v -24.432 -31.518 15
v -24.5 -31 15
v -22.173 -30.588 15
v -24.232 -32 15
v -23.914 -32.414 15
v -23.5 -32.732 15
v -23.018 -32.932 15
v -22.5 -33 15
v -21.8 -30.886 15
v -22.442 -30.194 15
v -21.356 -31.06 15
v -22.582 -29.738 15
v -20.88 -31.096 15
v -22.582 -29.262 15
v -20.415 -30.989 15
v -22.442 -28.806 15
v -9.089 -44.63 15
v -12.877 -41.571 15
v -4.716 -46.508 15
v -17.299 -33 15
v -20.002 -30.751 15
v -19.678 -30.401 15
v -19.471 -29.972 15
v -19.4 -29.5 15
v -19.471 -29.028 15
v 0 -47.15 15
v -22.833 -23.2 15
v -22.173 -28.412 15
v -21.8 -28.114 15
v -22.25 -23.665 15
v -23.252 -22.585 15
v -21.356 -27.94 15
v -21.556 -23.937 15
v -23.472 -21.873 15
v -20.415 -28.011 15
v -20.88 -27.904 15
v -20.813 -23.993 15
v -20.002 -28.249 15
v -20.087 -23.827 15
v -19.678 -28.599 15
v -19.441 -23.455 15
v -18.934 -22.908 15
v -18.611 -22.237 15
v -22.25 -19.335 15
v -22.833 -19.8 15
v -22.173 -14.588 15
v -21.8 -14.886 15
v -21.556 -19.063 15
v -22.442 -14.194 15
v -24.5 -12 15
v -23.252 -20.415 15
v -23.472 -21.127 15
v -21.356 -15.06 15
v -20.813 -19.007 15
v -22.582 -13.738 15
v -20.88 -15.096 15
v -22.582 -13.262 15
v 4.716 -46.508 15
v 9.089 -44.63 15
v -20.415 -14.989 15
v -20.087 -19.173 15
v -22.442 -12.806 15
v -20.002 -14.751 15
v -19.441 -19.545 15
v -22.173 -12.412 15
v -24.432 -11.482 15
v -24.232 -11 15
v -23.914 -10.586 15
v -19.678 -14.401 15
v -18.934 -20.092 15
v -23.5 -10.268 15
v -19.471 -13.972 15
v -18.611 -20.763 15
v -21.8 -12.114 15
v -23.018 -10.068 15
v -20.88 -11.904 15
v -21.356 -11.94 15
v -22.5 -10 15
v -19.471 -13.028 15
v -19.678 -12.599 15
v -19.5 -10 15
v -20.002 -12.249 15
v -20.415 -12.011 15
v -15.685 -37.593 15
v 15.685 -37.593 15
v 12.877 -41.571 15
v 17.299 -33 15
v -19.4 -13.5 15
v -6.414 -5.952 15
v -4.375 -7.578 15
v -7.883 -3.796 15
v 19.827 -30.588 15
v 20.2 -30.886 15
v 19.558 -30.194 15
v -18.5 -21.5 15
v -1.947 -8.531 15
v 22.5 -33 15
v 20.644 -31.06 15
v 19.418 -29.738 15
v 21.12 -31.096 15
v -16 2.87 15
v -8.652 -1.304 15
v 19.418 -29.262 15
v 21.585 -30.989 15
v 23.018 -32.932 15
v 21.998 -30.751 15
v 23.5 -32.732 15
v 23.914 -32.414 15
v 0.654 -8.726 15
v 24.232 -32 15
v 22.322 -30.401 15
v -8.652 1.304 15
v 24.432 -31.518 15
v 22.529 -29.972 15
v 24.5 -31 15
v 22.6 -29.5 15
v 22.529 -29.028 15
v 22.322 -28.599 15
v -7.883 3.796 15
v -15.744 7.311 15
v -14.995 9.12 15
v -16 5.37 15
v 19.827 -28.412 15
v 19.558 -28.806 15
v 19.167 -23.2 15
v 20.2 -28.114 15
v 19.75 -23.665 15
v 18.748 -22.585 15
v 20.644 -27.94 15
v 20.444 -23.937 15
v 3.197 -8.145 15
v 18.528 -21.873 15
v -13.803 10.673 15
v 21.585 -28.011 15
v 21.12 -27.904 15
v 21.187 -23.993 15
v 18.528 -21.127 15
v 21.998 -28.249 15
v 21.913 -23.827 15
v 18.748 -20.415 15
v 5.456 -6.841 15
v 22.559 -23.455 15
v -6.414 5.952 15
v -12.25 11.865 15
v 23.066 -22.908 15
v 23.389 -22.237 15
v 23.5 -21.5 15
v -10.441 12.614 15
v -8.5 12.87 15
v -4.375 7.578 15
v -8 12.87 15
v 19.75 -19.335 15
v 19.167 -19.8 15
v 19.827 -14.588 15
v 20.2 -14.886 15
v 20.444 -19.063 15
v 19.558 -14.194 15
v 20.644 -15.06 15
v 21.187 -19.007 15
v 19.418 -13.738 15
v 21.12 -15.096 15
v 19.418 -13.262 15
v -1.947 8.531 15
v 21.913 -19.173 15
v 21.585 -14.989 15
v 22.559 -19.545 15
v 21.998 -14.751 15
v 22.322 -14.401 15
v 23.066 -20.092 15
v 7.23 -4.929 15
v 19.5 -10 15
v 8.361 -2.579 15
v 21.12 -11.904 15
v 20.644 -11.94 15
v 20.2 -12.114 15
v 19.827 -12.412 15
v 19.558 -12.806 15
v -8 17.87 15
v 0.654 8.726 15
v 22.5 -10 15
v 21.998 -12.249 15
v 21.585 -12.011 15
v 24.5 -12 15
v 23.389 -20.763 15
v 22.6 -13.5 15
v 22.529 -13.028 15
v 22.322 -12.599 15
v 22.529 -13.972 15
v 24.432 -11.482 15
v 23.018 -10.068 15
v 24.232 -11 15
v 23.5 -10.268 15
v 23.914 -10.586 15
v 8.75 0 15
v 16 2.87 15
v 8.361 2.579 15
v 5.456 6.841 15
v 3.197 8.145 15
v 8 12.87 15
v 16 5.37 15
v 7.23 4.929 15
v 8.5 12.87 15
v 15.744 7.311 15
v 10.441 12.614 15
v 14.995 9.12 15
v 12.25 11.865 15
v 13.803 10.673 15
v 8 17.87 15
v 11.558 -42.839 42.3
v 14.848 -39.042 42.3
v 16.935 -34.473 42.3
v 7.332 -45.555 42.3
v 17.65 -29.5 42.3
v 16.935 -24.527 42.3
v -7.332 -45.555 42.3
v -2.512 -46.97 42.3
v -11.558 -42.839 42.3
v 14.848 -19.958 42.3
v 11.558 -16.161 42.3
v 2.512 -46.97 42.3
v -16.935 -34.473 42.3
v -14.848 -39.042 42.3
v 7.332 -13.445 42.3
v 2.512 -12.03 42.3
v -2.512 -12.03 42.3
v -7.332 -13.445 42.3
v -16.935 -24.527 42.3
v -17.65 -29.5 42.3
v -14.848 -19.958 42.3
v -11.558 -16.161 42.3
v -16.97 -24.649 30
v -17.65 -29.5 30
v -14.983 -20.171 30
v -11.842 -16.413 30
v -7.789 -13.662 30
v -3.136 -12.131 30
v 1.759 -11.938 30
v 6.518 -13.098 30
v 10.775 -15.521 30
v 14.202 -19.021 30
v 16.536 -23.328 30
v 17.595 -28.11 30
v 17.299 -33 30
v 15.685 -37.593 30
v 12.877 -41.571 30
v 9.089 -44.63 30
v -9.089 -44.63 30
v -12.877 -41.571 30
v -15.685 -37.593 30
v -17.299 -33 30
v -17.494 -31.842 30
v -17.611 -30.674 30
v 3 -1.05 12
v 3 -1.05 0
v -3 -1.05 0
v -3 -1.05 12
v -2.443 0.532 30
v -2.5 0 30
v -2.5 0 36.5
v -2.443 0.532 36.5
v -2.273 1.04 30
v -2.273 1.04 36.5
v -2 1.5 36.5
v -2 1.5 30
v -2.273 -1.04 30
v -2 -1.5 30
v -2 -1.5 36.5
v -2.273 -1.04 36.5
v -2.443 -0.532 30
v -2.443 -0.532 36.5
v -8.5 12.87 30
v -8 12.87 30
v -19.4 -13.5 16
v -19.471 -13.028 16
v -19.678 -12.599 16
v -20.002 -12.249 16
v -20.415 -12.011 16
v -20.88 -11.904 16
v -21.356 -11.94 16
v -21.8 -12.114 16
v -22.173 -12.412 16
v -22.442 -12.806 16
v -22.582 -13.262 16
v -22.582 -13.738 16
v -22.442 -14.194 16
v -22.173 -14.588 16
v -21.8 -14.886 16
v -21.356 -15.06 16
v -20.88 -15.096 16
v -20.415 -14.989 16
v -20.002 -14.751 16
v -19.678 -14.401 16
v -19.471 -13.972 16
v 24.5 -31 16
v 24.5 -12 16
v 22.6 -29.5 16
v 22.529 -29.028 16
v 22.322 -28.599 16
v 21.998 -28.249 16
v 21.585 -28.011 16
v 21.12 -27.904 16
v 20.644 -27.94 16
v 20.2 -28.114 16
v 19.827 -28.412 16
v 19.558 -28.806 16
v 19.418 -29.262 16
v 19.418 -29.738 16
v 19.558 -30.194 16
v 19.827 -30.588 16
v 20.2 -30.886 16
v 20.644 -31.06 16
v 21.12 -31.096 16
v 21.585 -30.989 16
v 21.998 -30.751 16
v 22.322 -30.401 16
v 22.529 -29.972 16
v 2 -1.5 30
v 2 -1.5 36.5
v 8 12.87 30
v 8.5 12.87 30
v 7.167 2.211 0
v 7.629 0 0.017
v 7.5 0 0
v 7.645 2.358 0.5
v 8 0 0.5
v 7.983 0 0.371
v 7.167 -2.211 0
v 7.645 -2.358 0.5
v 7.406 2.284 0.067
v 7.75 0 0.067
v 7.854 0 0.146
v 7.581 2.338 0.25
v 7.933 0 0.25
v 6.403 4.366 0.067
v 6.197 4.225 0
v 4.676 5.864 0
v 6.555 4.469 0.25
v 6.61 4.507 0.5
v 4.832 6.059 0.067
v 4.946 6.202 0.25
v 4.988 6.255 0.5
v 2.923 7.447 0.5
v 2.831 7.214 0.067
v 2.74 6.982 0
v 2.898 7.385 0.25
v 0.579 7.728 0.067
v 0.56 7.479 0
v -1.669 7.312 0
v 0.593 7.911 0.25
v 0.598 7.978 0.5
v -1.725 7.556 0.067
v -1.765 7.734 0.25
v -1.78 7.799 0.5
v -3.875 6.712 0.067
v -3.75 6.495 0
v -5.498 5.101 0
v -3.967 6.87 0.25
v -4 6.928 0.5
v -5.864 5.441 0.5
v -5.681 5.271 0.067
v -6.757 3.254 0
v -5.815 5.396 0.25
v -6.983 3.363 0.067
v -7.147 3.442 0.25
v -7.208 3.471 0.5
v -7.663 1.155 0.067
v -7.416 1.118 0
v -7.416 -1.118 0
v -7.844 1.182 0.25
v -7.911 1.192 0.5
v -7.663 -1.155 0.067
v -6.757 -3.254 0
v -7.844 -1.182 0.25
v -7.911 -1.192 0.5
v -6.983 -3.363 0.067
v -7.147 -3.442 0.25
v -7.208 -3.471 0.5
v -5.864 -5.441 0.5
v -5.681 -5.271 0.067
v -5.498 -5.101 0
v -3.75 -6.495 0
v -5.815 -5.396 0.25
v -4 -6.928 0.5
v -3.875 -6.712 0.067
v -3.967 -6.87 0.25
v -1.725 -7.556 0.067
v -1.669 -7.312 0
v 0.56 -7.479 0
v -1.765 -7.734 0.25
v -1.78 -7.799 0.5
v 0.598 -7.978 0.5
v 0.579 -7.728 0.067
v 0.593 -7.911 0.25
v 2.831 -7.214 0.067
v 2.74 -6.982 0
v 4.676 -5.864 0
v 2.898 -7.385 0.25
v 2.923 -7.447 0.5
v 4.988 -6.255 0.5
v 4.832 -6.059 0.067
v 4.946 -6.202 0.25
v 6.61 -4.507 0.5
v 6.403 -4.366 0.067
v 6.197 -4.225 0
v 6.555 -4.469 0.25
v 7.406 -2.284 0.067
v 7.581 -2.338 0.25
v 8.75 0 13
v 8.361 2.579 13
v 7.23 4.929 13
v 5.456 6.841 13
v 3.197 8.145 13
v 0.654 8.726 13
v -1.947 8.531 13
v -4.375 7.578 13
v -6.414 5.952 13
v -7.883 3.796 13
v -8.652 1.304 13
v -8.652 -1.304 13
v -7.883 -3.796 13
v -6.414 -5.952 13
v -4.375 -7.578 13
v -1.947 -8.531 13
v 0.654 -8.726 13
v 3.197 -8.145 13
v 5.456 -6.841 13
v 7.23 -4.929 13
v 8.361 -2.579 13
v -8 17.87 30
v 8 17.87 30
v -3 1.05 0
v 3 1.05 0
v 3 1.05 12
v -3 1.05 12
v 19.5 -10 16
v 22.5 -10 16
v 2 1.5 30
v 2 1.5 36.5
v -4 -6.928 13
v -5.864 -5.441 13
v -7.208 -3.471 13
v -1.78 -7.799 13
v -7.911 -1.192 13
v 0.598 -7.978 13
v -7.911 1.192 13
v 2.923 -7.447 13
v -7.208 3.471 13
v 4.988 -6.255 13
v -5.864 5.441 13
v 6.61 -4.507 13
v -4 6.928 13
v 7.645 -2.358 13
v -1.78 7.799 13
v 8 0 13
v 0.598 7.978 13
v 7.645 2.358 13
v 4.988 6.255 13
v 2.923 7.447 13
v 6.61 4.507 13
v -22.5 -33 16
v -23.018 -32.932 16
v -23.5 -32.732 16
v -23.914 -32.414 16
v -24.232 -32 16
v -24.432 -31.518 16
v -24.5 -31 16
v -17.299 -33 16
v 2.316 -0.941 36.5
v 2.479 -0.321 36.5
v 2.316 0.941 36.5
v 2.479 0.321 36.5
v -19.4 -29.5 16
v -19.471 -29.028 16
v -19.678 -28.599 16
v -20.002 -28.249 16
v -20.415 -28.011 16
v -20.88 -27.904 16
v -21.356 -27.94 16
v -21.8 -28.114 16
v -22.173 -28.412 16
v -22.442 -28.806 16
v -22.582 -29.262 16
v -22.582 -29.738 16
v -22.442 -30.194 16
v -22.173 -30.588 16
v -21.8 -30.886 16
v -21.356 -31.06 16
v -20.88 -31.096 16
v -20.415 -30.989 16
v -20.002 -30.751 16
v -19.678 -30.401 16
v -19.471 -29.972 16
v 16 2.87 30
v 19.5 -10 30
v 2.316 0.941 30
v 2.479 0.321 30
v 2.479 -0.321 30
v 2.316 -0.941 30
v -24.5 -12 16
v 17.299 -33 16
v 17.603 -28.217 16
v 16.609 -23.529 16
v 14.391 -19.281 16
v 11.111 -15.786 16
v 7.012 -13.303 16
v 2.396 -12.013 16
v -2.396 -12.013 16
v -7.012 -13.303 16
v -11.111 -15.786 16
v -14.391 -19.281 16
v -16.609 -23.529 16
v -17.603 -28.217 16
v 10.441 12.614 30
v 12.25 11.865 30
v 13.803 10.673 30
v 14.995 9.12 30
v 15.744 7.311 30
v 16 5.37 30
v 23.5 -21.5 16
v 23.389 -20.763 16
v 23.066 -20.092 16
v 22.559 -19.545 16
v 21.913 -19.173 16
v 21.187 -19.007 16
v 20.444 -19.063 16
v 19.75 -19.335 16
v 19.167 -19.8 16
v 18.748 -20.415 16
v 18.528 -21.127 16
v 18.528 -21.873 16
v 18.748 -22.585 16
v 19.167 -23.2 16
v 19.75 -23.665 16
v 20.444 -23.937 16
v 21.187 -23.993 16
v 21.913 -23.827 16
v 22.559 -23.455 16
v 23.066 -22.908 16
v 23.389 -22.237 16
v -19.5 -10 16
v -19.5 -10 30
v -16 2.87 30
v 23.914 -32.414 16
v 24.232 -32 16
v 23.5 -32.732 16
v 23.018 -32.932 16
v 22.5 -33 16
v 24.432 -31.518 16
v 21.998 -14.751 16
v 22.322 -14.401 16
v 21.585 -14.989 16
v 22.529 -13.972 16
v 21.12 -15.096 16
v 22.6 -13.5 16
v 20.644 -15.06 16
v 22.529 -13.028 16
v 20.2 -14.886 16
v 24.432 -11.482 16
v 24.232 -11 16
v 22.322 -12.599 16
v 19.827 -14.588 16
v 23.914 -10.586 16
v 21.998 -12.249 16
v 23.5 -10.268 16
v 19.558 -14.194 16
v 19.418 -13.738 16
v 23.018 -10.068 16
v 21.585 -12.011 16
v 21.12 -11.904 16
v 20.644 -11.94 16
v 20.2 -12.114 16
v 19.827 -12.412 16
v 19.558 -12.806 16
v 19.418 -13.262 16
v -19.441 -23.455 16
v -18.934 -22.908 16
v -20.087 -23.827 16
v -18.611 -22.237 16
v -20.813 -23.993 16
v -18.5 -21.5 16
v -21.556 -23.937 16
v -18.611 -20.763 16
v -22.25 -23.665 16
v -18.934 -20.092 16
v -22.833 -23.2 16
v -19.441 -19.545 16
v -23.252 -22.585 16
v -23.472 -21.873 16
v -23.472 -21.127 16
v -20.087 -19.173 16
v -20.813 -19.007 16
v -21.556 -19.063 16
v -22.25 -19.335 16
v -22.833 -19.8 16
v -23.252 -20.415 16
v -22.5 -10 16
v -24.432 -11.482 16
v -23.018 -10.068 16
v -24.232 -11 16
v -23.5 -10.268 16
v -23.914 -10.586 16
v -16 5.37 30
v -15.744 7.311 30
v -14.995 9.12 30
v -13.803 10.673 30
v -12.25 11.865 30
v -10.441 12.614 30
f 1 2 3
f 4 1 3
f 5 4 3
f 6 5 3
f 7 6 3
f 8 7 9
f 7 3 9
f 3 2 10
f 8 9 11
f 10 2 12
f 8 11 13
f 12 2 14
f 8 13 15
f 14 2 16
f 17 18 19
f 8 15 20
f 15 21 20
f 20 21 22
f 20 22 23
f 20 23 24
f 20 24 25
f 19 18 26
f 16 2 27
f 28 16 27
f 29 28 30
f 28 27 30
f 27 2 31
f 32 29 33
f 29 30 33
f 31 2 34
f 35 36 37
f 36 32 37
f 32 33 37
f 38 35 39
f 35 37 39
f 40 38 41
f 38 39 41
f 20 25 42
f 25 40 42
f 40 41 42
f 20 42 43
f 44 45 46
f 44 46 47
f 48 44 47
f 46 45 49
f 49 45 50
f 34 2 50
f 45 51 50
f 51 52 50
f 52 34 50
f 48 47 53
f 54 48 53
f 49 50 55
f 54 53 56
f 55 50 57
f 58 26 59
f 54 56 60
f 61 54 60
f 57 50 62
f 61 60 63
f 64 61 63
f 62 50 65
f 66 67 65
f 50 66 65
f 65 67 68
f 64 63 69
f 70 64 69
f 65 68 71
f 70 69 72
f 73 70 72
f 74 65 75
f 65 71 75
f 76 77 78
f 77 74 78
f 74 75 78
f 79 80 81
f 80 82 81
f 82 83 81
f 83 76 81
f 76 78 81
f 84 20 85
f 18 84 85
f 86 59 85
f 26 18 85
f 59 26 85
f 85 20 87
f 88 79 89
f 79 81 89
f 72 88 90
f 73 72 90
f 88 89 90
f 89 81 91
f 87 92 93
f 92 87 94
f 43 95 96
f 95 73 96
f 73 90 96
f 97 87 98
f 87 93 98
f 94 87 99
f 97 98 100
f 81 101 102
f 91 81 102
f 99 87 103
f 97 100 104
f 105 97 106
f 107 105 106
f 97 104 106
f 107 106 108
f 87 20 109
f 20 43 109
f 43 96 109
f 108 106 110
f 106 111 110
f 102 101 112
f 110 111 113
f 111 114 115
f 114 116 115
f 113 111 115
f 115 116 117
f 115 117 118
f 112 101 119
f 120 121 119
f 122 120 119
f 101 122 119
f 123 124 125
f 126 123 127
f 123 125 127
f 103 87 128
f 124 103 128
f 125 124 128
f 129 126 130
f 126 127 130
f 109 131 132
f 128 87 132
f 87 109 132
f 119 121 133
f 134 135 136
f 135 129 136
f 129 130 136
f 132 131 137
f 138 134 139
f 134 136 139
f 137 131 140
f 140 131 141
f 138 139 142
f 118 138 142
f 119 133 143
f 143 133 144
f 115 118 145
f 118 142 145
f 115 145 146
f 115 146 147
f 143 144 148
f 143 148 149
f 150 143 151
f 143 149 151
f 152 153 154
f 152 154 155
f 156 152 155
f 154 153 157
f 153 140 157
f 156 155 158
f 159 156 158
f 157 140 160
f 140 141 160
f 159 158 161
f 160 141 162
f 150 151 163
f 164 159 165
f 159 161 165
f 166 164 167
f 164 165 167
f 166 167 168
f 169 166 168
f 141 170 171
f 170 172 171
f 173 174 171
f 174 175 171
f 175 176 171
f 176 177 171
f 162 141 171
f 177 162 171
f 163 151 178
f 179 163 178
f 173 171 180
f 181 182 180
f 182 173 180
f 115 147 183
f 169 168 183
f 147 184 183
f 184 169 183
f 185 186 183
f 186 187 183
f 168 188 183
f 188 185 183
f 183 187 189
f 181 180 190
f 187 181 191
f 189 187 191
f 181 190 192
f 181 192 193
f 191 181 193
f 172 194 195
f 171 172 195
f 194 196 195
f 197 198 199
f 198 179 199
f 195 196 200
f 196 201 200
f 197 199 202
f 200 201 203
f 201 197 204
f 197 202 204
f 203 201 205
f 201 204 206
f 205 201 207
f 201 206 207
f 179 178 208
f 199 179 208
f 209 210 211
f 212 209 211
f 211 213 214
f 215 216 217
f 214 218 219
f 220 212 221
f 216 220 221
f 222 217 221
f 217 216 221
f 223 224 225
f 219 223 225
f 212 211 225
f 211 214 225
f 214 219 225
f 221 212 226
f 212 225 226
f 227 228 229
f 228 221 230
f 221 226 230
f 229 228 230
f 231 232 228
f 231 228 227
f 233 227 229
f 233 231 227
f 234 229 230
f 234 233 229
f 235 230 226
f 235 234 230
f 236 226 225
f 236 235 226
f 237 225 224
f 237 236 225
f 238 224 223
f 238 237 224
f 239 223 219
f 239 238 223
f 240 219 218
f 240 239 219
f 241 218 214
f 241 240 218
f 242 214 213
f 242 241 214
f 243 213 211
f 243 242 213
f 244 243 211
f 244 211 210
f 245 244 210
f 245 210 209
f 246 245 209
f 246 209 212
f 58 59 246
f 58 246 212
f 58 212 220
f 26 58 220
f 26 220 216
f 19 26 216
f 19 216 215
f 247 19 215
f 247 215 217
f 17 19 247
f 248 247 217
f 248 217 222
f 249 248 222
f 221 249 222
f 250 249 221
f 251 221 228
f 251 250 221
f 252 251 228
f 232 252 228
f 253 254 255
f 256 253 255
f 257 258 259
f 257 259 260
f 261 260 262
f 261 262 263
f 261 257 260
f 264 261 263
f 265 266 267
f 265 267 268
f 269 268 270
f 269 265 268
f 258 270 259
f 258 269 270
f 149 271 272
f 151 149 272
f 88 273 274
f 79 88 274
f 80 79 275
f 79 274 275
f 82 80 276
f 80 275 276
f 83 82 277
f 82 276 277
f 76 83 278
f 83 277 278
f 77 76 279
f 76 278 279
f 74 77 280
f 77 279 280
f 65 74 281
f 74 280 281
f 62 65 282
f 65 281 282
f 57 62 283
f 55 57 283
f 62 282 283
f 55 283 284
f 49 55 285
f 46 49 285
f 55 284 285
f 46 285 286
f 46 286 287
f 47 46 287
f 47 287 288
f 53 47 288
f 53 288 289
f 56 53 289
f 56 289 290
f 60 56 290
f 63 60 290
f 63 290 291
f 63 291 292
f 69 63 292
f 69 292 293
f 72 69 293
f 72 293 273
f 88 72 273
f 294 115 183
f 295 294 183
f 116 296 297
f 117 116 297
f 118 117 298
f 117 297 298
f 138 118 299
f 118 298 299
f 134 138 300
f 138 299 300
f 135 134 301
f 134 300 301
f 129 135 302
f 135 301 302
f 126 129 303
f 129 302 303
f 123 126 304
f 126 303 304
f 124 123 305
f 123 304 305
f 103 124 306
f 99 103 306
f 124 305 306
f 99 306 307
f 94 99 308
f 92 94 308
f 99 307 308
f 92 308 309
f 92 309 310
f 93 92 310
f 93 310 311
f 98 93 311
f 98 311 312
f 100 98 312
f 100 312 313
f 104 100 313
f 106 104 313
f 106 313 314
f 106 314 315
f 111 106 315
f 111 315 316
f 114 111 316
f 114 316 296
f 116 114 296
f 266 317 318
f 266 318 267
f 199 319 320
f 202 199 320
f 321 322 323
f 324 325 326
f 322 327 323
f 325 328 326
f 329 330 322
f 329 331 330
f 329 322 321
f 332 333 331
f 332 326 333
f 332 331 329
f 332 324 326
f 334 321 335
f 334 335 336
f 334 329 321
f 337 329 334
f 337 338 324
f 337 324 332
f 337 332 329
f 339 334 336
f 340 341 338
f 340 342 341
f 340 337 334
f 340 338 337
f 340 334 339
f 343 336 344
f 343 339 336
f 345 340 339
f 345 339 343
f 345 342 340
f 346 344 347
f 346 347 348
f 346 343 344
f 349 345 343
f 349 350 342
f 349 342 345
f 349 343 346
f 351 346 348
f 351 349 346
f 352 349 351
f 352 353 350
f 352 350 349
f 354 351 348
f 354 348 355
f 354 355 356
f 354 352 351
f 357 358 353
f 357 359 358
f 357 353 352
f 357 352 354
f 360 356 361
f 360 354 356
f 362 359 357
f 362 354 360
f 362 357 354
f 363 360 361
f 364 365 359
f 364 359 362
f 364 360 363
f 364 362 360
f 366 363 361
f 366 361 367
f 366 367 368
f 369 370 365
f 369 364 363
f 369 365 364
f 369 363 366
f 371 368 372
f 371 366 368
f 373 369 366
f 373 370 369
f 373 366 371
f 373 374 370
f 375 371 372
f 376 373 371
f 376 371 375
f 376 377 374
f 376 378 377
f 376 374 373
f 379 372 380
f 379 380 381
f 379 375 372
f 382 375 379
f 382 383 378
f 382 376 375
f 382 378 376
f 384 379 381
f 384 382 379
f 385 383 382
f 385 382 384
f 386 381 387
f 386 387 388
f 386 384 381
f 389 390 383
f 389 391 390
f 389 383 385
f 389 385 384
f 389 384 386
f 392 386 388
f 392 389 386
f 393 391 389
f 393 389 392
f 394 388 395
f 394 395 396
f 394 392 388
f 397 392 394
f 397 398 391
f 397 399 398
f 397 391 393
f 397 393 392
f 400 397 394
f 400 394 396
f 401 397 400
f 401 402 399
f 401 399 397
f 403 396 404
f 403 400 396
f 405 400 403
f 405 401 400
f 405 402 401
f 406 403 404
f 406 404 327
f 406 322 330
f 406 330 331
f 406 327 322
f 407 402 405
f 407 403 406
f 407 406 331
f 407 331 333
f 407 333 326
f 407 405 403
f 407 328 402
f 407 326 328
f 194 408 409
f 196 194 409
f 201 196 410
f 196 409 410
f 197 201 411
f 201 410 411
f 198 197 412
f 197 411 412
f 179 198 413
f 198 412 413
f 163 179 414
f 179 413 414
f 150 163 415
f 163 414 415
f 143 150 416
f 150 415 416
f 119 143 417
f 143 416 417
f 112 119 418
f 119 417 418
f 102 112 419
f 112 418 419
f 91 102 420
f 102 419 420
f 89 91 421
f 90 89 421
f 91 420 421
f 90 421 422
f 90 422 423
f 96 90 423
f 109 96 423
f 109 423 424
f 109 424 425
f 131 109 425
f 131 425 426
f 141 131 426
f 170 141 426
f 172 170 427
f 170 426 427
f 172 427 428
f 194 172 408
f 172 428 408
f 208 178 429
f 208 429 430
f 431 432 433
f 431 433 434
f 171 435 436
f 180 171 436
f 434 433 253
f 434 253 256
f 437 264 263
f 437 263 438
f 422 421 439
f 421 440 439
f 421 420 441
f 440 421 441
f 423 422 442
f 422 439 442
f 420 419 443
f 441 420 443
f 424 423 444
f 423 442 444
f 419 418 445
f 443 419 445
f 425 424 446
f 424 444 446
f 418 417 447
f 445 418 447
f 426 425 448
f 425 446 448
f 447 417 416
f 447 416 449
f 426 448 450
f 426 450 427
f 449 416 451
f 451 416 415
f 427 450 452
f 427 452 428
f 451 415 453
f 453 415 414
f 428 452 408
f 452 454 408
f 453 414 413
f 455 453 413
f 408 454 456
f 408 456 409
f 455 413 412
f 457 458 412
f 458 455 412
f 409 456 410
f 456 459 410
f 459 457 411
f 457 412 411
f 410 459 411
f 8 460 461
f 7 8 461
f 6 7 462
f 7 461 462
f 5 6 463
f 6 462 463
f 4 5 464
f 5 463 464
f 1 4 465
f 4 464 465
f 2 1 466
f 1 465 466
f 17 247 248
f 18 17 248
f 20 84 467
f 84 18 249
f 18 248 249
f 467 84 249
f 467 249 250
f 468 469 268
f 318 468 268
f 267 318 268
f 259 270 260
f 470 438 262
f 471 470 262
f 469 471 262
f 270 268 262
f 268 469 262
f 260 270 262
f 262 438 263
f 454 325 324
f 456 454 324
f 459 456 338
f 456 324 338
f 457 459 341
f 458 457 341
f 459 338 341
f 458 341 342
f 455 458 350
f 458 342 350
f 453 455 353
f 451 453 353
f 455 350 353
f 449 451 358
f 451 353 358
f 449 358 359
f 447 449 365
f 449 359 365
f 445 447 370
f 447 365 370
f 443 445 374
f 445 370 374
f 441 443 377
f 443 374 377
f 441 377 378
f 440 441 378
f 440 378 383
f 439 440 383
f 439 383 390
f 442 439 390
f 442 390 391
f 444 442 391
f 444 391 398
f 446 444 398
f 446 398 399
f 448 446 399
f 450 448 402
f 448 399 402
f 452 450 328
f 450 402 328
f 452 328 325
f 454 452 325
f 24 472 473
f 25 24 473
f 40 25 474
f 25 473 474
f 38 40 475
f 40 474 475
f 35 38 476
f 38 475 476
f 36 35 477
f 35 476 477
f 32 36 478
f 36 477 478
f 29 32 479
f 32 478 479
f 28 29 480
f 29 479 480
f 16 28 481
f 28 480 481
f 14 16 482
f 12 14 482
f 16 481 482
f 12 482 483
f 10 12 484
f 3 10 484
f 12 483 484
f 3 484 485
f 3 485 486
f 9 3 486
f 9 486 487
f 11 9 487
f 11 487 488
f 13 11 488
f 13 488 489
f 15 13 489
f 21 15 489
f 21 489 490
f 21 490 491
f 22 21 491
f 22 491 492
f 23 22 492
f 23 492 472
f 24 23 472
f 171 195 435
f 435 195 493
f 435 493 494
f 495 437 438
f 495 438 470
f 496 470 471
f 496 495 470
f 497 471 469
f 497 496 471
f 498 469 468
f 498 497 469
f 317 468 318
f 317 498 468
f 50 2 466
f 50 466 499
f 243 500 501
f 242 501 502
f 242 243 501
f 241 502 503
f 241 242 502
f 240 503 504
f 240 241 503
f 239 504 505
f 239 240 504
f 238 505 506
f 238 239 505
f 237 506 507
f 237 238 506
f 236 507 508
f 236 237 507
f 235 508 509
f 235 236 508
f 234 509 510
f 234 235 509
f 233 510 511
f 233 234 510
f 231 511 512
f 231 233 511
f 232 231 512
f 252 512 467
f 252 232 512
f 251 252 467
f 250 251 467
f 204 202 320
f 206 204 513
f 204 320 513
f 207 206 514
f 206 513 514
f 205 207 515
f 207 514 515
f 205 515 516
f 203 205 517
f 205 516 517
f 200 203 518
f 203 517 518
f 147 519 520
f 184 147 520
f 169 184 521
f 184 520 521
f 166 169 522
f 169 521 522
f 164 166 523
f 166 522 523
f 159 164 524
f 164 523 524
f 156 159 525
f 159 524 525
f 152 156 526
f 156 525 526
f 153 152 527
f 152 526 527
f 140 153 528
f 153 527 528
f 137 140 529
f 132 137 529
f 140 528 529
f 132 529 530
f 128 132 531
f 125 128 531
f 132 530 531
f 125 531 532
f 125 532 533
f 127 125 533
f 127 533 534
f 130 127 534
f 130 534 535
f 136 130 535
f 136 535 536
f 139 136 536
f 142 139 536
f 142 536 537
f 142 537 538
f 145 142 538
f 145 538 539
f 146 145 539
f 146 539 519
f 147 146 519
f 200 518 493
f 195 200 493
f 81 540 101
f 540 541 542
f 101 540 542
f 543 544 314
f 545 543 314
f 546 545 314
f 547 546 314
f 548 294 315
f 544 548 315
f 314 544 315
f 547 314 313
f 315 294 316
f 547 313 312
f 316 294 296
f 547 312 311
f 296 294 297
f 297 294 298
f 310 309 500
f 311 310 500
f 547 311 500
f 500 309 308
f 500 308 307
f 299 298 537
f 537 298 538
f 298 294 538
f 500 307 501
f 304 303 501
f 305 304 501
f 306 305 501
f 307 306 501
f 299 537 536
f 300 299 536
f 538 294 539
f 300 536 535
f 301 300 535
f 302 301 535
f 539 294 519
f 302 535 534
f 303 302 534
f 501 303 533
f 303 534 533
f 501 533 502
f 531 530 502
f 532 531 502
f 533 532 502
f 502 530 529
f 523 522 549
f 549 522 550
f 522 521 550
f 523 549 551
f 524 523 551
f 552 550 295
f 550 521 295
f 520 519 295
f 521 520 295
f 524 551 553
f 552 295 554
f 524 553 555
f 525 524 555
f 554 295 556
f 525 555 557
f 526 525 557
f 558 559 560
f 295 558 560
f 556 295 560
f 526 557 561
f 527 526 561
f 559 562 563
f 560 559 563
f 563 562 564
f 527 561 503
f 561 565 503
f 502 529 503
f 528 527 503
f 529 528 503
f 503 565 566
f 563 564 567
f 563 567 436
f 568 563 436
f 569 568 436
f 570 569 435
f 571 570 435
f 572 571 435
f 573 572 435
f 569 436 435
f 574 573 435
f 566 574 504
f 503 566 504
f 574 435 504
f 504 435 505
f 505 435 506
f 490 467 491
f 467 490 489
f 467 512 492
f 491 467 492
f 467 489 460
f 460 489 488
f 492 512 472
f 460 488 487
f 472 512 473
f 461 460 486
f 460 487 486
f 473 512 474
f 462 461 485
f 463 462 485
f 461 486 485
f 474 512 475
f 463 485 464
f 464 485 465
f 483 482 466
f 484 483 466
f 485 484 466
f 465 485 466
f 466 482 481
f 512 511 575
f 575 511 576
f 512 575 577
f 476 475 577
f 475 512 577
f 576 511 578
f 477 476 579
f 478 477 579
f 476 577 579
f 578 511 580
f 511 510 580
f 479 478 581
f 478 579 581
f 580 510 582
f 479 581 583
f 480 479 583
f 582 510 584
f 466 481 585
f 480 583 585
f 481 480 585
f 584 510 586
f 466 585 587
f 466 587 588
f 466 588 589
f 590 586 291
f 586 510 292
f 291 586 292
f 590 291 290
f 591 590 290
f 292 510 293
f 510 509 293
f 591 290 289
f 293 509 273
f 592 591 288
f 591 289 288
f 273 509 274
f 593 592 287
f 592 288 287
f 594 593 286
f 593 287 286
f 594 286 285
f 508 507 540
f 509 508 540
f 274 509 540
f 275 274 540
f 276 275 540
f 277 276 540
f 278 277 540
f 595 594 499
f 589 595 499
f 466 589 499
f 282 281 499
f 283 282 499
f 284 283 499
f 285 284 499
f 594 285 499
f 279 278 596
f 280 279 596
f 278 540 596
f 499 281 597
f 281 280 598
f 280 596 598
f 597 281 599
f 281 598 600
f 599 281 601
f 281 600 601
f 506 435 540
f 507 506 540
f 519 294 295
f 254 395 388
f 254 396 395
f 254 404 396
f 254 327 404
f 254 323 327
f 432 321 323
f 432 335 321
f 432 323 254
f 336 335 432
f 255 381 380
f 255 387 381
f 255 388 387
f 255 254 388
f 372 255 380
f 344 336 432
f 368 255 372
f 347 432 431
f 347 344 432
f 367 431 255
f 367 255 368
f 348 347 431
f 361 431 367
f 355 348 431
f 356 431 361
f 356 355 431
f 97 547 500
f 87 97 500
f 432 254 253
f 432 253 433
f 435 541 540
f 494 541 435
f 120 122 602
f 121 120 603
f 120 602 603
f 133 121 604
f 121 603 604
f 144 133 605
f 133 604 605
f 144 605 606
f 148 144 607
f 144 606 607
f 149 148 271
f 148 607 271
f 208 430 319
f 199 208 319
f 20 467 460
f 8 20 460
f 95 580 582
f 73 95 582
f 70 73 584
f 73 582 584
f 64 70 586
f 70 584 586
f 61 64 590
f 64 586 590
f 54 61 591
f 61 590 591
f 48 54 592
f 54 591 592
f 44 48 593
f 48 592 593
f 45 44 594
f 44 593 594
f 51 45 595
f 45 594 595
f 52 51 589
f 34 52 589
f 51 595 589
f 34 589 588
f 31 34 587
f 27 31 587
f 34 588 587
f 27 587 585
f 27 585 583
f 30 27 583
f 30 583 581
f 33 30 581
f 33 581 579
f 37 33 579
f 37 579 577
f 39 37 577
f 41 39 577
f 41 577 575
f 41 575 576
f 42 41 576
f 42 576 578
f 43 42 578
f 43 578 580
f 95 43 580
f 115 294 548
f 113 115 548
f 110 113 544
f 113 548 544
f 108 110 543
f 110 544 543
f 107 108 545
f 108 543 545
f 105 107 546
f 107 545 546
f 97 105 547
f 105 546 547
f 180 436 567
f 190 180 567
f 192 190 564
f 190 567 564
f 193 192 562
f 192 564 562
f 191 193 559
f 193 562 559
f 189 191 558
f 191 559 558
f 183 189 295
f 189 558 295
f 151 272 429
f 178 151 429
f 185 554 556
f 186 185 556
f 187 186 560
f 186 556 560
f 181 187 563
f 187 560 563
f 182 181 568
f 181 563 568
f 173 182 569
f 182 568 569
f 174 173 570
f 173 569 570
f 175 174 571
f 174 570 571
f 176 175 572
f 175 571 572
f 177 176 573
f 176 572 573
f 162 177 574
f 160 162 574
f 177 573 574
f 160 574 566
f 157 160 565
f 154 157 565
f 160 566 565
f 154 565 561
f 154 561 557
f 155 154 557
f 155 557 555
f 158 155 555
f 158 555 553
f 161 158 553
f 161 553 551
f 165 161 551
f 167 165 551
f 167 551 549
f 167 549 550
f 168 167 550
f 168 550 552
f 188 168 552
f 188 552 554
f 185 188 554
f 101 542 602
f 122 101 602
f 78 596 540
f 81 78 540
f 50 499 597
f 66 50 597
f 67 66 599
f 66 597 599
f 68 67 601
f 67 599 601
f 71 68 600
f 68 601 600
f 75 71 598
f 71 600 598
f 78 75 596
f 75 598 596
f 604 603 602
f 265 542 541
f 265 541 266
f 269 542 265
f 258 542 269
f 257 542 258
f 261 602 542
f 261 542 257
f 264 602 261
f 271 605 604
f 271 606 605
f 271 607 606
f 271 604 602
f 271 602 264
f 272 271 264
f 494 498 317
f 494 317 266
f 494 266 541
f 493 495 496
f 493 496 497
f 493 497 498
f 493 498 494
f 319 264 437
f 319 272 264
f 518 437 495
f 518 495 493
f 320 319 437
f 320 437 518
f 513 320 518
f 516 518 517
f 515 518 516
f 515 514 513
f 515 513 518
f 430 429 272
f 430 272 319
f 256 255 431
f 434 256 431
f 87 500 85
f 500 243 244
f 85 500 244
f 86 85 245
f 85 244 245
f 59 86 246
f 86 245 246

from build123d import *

# Parameters (mm, degrees)
SKETCH1_R           = 8
BOSS_EXTRUDE1_DEPTH = 13
SKETCH2_R           = 8.75
BOSS_EXTRUDE2_DEPTH = 2
SKETCH3_W           = 49
SKETCH3_H           = 62.5
BOSS_EXTRUDE3_DEPTH = 15
SKETCH4_R           = 17.65
BOSS_EXTRUDE4_DEPTH = 27.3
BOSS_EXTRUDE6_DEPTH = 36.5
SKETCH7_W           = 81.110714311
SKETCH7_H           = 82.460514398
CUT_EXTRUDE1_DEPTH  = 31
CUT_EXTRUDE2_DEPTH  = 14
SKETCH9_R           = 2.5
CUT_EXTRUDE4_DEPTH  = 17
SKETCH10_R          = 1.6
CUT_EXTRUDE5_DEPTH  = 17
FILLET1_R           = 0.5
SKETCH11_W          = 6
SKETCH11_H          = 2.1
CUT_EXTRUDE6_DEPTH  = 12


with BuildPart() as part:
    # Sketch1 → Boss-Extrude1 (new body)
    with BuildSketch(Plane.XY):
        Circle(SKETCH1_R)
    extrude(amount=BOSS_EXTRUDE1_DEPTH)

    # Sketch2 → Boss-Extrude2 (add)
    with BuildSketch(Plane.XY.offset(13)):
        Circle(SKETCH2_R)
    extrude(amount=BOSS_EXTRUDE2_DEPTH)

    # Sketch3 → Boss-Extrude3 (add)
    with BuildSketch(Plane.XY.offset(15)):
        with Locations((0, -13.38)):
            Rectangle(SKETCH3_W, SKETCH3_H)
    extrude(amount=BOSS_EXTRUDE3_DEPTH)

    # Sketch4 → Boss-Extrude4 (add)
    with BuildSketch(Plane(origin=(0, 0, 15), x_dir=(-1, 0, 0), z_dir=(0, 0, -1))):
        with Locations((0, -29.5)):
            Circle(SKETCH4_R)
    extrude(amount=-BOSS_EXTRUDE4_DEPTH)

    # Sketch6 → Boss-Extrude6 (add)
    with BuildSketch(Plane(origin=(0, 0, 0), x_dir=(-1, 0, 0), z_dir=(0, 0, -1))):
        with BuildLine():
            Line((2, 1.5), (-2, 1.5))
            ThreePointArc((-2, 1.5), (-2.5, 0), (-2, -1.5))
            Line((-2, -1.5), (2, -1.5))
            ThreePointArc((2, -1.5), (2.371708245, -0.790569415), (2.5, 0))
            ThreePointArc((2.5, 0), (2.371708245, 0.790569415), (2, 1.5))
        make_face()
    extrude(amount=-BOSS_EXTRUDE6_DEPTH)

    # Sketch7 → Cut-Extrude1 (cut, through all)
    with BuildSketch(Plane.XY.offset(30)):
        with Locations((0.873030834, -13.704939381)):
            Rectangle(SKETCH7_W, SKETCH7_H)
        with BuildLine():
            Line((-8, 17.87), (8, 17.87))
            Line((8, 17.87), (8, 12.87))
            Line((8, 12.87), (8.5, 12.87))
            ThreePointArc((8.5, 12.87), (13.803300859, 10.673300859), (16, 5.37))
            Line((16, 5.37), (16, 2.87))
            Line((16, 2.87), (19.5, -10))
            Line((19.5, -10), (22.5, -10))
            ThreePointArc((22.5, -10), (23.914213562, -10.585786438), (24.5, -12))
            Line((24.5, -12), (24.5, -31))
            ThreePointArc((24.5, -31), (23.914213562, -32.414213562), (22.5, -33))
            Line((22.5, -33), (17.299494212, -33))
            ThreePointArc((17.299494212, -33), (0, -47.15), (-17.299494212, -33))
            Line((-17.299494212, -33), (-22.5, -33))
            ThreePointArc((-22.5, -33), (-23.914213562, -32.414213562), (-24.5, -31))
            Line((-24.5, -31), (-24.5, -12))
            ThreePointArc((-24.5, -12), (-23.914213562, -10.585786438), (-22.5, -10))
            Line((-22.5, -10), (-19.5, -10))
            Line((-19.5, -10), (-16, 2.87))
            Line((-16, 2.87), (-16, 5.37))
            ThreePointArc((-16, 5.37), (-13.803300859, 10.673300859), (-8.5, 12.87))
            Line((-8.5, 12.87), (-8, 12.87))
            Line((-8, 12.87), (-8, 17.87))
        make_face(mode=Mode.SUBTRACT)
    extrude(amount=-CUT_EXTRUDE1_DEPTH, mode=Mode.SUBTRACT)

    # Sketch8 → Cut-Extrude2 (cut)
    with BuildSketch(Plane.XY.offset(30)):
        with BuildLine():
            Line((-17.299494212, -33), (-22.5, -33))
            ThreePointArc((-22.5, -33), (-23.914213562, -32.414213562), (-24.5, -31))
            Line((-24.5, -31), (-24.5, -12))
            ThreePointArc((-24.5, -12), (-23.914213562, -10.585786438), (-22.5, -10))
            Line((-22.5, -10), (22.5, -10))
            ThreePointArc((22.5, -10), (23.914213562, -10.585786438), (24.5, -12))
            Line((24.5, -12), (24.5, -31))
            ThreePointArc((24.5, -31), (23.914213562, -32.414213562), (22.5, -33))
            Line((22.5, -33), (17.299494212, -33))
            ThreePointArc((17.299494212, -33), (0, -11.85), (-17.299494212, -33))
        make_face()
    extrude(amount=-CUT_EXTRUDE2_DEPTH, mode=Mode.SUBTRACT)

    # Sketch9 → Cut-Extrude4 (cut, through all)
    with BuildSketch(Plane.XY.offset(16)):
        with Locations((-21, -21.5)):
            Circle(SKETCH9_R)
        with Locations((21, -21.5)):
            Circle(SKETCH9_R)
    extrude(amount=-CUT_EXTRUDE4_DEPTH, mode=Mode.SUBTRACT)

    # Sketch10 → Cut-Extrude5 (cut, through all)
    with BuildSketch(Plane.XY.offset(16)):
        with Locations((-21, -13.5)):
            Circle(SKETCH10_R)
        with Locations((21, -13.5)):
            Circle(SKETCH10_R)
        with Locations((21, -29.5)):
            Circle(SKETCH10_R)
        with Locations((-21, -29.5)):
            Circle(SKETCH10_R)
    extrude(amount=-CUT_EXTRUDE5_DEPTH, mode=Mode.SUBTRACT)

    # Fillet1
    fillet1_edges = [part.edges().sort_by_distance(p)[0] for p in [
        (-8, 0, 0),
    ]]
    fillet(fillet1_edges, radius=FILLET1_R)

    # Sketch11 → Cut-Extrude6 (cut)
    with BuildSketch(Plane(origin=(0, 0, 0), x_dir=(-1, 0, 0), z_dir=(0, 0, -1))):
        Rectangle(SKETCH11_W, SKETCH11_H)
    extrude(amount=-CUT_EXTRUDE6_DEPTH, mode=Mode.SUBTRACT)


solid = part.part
